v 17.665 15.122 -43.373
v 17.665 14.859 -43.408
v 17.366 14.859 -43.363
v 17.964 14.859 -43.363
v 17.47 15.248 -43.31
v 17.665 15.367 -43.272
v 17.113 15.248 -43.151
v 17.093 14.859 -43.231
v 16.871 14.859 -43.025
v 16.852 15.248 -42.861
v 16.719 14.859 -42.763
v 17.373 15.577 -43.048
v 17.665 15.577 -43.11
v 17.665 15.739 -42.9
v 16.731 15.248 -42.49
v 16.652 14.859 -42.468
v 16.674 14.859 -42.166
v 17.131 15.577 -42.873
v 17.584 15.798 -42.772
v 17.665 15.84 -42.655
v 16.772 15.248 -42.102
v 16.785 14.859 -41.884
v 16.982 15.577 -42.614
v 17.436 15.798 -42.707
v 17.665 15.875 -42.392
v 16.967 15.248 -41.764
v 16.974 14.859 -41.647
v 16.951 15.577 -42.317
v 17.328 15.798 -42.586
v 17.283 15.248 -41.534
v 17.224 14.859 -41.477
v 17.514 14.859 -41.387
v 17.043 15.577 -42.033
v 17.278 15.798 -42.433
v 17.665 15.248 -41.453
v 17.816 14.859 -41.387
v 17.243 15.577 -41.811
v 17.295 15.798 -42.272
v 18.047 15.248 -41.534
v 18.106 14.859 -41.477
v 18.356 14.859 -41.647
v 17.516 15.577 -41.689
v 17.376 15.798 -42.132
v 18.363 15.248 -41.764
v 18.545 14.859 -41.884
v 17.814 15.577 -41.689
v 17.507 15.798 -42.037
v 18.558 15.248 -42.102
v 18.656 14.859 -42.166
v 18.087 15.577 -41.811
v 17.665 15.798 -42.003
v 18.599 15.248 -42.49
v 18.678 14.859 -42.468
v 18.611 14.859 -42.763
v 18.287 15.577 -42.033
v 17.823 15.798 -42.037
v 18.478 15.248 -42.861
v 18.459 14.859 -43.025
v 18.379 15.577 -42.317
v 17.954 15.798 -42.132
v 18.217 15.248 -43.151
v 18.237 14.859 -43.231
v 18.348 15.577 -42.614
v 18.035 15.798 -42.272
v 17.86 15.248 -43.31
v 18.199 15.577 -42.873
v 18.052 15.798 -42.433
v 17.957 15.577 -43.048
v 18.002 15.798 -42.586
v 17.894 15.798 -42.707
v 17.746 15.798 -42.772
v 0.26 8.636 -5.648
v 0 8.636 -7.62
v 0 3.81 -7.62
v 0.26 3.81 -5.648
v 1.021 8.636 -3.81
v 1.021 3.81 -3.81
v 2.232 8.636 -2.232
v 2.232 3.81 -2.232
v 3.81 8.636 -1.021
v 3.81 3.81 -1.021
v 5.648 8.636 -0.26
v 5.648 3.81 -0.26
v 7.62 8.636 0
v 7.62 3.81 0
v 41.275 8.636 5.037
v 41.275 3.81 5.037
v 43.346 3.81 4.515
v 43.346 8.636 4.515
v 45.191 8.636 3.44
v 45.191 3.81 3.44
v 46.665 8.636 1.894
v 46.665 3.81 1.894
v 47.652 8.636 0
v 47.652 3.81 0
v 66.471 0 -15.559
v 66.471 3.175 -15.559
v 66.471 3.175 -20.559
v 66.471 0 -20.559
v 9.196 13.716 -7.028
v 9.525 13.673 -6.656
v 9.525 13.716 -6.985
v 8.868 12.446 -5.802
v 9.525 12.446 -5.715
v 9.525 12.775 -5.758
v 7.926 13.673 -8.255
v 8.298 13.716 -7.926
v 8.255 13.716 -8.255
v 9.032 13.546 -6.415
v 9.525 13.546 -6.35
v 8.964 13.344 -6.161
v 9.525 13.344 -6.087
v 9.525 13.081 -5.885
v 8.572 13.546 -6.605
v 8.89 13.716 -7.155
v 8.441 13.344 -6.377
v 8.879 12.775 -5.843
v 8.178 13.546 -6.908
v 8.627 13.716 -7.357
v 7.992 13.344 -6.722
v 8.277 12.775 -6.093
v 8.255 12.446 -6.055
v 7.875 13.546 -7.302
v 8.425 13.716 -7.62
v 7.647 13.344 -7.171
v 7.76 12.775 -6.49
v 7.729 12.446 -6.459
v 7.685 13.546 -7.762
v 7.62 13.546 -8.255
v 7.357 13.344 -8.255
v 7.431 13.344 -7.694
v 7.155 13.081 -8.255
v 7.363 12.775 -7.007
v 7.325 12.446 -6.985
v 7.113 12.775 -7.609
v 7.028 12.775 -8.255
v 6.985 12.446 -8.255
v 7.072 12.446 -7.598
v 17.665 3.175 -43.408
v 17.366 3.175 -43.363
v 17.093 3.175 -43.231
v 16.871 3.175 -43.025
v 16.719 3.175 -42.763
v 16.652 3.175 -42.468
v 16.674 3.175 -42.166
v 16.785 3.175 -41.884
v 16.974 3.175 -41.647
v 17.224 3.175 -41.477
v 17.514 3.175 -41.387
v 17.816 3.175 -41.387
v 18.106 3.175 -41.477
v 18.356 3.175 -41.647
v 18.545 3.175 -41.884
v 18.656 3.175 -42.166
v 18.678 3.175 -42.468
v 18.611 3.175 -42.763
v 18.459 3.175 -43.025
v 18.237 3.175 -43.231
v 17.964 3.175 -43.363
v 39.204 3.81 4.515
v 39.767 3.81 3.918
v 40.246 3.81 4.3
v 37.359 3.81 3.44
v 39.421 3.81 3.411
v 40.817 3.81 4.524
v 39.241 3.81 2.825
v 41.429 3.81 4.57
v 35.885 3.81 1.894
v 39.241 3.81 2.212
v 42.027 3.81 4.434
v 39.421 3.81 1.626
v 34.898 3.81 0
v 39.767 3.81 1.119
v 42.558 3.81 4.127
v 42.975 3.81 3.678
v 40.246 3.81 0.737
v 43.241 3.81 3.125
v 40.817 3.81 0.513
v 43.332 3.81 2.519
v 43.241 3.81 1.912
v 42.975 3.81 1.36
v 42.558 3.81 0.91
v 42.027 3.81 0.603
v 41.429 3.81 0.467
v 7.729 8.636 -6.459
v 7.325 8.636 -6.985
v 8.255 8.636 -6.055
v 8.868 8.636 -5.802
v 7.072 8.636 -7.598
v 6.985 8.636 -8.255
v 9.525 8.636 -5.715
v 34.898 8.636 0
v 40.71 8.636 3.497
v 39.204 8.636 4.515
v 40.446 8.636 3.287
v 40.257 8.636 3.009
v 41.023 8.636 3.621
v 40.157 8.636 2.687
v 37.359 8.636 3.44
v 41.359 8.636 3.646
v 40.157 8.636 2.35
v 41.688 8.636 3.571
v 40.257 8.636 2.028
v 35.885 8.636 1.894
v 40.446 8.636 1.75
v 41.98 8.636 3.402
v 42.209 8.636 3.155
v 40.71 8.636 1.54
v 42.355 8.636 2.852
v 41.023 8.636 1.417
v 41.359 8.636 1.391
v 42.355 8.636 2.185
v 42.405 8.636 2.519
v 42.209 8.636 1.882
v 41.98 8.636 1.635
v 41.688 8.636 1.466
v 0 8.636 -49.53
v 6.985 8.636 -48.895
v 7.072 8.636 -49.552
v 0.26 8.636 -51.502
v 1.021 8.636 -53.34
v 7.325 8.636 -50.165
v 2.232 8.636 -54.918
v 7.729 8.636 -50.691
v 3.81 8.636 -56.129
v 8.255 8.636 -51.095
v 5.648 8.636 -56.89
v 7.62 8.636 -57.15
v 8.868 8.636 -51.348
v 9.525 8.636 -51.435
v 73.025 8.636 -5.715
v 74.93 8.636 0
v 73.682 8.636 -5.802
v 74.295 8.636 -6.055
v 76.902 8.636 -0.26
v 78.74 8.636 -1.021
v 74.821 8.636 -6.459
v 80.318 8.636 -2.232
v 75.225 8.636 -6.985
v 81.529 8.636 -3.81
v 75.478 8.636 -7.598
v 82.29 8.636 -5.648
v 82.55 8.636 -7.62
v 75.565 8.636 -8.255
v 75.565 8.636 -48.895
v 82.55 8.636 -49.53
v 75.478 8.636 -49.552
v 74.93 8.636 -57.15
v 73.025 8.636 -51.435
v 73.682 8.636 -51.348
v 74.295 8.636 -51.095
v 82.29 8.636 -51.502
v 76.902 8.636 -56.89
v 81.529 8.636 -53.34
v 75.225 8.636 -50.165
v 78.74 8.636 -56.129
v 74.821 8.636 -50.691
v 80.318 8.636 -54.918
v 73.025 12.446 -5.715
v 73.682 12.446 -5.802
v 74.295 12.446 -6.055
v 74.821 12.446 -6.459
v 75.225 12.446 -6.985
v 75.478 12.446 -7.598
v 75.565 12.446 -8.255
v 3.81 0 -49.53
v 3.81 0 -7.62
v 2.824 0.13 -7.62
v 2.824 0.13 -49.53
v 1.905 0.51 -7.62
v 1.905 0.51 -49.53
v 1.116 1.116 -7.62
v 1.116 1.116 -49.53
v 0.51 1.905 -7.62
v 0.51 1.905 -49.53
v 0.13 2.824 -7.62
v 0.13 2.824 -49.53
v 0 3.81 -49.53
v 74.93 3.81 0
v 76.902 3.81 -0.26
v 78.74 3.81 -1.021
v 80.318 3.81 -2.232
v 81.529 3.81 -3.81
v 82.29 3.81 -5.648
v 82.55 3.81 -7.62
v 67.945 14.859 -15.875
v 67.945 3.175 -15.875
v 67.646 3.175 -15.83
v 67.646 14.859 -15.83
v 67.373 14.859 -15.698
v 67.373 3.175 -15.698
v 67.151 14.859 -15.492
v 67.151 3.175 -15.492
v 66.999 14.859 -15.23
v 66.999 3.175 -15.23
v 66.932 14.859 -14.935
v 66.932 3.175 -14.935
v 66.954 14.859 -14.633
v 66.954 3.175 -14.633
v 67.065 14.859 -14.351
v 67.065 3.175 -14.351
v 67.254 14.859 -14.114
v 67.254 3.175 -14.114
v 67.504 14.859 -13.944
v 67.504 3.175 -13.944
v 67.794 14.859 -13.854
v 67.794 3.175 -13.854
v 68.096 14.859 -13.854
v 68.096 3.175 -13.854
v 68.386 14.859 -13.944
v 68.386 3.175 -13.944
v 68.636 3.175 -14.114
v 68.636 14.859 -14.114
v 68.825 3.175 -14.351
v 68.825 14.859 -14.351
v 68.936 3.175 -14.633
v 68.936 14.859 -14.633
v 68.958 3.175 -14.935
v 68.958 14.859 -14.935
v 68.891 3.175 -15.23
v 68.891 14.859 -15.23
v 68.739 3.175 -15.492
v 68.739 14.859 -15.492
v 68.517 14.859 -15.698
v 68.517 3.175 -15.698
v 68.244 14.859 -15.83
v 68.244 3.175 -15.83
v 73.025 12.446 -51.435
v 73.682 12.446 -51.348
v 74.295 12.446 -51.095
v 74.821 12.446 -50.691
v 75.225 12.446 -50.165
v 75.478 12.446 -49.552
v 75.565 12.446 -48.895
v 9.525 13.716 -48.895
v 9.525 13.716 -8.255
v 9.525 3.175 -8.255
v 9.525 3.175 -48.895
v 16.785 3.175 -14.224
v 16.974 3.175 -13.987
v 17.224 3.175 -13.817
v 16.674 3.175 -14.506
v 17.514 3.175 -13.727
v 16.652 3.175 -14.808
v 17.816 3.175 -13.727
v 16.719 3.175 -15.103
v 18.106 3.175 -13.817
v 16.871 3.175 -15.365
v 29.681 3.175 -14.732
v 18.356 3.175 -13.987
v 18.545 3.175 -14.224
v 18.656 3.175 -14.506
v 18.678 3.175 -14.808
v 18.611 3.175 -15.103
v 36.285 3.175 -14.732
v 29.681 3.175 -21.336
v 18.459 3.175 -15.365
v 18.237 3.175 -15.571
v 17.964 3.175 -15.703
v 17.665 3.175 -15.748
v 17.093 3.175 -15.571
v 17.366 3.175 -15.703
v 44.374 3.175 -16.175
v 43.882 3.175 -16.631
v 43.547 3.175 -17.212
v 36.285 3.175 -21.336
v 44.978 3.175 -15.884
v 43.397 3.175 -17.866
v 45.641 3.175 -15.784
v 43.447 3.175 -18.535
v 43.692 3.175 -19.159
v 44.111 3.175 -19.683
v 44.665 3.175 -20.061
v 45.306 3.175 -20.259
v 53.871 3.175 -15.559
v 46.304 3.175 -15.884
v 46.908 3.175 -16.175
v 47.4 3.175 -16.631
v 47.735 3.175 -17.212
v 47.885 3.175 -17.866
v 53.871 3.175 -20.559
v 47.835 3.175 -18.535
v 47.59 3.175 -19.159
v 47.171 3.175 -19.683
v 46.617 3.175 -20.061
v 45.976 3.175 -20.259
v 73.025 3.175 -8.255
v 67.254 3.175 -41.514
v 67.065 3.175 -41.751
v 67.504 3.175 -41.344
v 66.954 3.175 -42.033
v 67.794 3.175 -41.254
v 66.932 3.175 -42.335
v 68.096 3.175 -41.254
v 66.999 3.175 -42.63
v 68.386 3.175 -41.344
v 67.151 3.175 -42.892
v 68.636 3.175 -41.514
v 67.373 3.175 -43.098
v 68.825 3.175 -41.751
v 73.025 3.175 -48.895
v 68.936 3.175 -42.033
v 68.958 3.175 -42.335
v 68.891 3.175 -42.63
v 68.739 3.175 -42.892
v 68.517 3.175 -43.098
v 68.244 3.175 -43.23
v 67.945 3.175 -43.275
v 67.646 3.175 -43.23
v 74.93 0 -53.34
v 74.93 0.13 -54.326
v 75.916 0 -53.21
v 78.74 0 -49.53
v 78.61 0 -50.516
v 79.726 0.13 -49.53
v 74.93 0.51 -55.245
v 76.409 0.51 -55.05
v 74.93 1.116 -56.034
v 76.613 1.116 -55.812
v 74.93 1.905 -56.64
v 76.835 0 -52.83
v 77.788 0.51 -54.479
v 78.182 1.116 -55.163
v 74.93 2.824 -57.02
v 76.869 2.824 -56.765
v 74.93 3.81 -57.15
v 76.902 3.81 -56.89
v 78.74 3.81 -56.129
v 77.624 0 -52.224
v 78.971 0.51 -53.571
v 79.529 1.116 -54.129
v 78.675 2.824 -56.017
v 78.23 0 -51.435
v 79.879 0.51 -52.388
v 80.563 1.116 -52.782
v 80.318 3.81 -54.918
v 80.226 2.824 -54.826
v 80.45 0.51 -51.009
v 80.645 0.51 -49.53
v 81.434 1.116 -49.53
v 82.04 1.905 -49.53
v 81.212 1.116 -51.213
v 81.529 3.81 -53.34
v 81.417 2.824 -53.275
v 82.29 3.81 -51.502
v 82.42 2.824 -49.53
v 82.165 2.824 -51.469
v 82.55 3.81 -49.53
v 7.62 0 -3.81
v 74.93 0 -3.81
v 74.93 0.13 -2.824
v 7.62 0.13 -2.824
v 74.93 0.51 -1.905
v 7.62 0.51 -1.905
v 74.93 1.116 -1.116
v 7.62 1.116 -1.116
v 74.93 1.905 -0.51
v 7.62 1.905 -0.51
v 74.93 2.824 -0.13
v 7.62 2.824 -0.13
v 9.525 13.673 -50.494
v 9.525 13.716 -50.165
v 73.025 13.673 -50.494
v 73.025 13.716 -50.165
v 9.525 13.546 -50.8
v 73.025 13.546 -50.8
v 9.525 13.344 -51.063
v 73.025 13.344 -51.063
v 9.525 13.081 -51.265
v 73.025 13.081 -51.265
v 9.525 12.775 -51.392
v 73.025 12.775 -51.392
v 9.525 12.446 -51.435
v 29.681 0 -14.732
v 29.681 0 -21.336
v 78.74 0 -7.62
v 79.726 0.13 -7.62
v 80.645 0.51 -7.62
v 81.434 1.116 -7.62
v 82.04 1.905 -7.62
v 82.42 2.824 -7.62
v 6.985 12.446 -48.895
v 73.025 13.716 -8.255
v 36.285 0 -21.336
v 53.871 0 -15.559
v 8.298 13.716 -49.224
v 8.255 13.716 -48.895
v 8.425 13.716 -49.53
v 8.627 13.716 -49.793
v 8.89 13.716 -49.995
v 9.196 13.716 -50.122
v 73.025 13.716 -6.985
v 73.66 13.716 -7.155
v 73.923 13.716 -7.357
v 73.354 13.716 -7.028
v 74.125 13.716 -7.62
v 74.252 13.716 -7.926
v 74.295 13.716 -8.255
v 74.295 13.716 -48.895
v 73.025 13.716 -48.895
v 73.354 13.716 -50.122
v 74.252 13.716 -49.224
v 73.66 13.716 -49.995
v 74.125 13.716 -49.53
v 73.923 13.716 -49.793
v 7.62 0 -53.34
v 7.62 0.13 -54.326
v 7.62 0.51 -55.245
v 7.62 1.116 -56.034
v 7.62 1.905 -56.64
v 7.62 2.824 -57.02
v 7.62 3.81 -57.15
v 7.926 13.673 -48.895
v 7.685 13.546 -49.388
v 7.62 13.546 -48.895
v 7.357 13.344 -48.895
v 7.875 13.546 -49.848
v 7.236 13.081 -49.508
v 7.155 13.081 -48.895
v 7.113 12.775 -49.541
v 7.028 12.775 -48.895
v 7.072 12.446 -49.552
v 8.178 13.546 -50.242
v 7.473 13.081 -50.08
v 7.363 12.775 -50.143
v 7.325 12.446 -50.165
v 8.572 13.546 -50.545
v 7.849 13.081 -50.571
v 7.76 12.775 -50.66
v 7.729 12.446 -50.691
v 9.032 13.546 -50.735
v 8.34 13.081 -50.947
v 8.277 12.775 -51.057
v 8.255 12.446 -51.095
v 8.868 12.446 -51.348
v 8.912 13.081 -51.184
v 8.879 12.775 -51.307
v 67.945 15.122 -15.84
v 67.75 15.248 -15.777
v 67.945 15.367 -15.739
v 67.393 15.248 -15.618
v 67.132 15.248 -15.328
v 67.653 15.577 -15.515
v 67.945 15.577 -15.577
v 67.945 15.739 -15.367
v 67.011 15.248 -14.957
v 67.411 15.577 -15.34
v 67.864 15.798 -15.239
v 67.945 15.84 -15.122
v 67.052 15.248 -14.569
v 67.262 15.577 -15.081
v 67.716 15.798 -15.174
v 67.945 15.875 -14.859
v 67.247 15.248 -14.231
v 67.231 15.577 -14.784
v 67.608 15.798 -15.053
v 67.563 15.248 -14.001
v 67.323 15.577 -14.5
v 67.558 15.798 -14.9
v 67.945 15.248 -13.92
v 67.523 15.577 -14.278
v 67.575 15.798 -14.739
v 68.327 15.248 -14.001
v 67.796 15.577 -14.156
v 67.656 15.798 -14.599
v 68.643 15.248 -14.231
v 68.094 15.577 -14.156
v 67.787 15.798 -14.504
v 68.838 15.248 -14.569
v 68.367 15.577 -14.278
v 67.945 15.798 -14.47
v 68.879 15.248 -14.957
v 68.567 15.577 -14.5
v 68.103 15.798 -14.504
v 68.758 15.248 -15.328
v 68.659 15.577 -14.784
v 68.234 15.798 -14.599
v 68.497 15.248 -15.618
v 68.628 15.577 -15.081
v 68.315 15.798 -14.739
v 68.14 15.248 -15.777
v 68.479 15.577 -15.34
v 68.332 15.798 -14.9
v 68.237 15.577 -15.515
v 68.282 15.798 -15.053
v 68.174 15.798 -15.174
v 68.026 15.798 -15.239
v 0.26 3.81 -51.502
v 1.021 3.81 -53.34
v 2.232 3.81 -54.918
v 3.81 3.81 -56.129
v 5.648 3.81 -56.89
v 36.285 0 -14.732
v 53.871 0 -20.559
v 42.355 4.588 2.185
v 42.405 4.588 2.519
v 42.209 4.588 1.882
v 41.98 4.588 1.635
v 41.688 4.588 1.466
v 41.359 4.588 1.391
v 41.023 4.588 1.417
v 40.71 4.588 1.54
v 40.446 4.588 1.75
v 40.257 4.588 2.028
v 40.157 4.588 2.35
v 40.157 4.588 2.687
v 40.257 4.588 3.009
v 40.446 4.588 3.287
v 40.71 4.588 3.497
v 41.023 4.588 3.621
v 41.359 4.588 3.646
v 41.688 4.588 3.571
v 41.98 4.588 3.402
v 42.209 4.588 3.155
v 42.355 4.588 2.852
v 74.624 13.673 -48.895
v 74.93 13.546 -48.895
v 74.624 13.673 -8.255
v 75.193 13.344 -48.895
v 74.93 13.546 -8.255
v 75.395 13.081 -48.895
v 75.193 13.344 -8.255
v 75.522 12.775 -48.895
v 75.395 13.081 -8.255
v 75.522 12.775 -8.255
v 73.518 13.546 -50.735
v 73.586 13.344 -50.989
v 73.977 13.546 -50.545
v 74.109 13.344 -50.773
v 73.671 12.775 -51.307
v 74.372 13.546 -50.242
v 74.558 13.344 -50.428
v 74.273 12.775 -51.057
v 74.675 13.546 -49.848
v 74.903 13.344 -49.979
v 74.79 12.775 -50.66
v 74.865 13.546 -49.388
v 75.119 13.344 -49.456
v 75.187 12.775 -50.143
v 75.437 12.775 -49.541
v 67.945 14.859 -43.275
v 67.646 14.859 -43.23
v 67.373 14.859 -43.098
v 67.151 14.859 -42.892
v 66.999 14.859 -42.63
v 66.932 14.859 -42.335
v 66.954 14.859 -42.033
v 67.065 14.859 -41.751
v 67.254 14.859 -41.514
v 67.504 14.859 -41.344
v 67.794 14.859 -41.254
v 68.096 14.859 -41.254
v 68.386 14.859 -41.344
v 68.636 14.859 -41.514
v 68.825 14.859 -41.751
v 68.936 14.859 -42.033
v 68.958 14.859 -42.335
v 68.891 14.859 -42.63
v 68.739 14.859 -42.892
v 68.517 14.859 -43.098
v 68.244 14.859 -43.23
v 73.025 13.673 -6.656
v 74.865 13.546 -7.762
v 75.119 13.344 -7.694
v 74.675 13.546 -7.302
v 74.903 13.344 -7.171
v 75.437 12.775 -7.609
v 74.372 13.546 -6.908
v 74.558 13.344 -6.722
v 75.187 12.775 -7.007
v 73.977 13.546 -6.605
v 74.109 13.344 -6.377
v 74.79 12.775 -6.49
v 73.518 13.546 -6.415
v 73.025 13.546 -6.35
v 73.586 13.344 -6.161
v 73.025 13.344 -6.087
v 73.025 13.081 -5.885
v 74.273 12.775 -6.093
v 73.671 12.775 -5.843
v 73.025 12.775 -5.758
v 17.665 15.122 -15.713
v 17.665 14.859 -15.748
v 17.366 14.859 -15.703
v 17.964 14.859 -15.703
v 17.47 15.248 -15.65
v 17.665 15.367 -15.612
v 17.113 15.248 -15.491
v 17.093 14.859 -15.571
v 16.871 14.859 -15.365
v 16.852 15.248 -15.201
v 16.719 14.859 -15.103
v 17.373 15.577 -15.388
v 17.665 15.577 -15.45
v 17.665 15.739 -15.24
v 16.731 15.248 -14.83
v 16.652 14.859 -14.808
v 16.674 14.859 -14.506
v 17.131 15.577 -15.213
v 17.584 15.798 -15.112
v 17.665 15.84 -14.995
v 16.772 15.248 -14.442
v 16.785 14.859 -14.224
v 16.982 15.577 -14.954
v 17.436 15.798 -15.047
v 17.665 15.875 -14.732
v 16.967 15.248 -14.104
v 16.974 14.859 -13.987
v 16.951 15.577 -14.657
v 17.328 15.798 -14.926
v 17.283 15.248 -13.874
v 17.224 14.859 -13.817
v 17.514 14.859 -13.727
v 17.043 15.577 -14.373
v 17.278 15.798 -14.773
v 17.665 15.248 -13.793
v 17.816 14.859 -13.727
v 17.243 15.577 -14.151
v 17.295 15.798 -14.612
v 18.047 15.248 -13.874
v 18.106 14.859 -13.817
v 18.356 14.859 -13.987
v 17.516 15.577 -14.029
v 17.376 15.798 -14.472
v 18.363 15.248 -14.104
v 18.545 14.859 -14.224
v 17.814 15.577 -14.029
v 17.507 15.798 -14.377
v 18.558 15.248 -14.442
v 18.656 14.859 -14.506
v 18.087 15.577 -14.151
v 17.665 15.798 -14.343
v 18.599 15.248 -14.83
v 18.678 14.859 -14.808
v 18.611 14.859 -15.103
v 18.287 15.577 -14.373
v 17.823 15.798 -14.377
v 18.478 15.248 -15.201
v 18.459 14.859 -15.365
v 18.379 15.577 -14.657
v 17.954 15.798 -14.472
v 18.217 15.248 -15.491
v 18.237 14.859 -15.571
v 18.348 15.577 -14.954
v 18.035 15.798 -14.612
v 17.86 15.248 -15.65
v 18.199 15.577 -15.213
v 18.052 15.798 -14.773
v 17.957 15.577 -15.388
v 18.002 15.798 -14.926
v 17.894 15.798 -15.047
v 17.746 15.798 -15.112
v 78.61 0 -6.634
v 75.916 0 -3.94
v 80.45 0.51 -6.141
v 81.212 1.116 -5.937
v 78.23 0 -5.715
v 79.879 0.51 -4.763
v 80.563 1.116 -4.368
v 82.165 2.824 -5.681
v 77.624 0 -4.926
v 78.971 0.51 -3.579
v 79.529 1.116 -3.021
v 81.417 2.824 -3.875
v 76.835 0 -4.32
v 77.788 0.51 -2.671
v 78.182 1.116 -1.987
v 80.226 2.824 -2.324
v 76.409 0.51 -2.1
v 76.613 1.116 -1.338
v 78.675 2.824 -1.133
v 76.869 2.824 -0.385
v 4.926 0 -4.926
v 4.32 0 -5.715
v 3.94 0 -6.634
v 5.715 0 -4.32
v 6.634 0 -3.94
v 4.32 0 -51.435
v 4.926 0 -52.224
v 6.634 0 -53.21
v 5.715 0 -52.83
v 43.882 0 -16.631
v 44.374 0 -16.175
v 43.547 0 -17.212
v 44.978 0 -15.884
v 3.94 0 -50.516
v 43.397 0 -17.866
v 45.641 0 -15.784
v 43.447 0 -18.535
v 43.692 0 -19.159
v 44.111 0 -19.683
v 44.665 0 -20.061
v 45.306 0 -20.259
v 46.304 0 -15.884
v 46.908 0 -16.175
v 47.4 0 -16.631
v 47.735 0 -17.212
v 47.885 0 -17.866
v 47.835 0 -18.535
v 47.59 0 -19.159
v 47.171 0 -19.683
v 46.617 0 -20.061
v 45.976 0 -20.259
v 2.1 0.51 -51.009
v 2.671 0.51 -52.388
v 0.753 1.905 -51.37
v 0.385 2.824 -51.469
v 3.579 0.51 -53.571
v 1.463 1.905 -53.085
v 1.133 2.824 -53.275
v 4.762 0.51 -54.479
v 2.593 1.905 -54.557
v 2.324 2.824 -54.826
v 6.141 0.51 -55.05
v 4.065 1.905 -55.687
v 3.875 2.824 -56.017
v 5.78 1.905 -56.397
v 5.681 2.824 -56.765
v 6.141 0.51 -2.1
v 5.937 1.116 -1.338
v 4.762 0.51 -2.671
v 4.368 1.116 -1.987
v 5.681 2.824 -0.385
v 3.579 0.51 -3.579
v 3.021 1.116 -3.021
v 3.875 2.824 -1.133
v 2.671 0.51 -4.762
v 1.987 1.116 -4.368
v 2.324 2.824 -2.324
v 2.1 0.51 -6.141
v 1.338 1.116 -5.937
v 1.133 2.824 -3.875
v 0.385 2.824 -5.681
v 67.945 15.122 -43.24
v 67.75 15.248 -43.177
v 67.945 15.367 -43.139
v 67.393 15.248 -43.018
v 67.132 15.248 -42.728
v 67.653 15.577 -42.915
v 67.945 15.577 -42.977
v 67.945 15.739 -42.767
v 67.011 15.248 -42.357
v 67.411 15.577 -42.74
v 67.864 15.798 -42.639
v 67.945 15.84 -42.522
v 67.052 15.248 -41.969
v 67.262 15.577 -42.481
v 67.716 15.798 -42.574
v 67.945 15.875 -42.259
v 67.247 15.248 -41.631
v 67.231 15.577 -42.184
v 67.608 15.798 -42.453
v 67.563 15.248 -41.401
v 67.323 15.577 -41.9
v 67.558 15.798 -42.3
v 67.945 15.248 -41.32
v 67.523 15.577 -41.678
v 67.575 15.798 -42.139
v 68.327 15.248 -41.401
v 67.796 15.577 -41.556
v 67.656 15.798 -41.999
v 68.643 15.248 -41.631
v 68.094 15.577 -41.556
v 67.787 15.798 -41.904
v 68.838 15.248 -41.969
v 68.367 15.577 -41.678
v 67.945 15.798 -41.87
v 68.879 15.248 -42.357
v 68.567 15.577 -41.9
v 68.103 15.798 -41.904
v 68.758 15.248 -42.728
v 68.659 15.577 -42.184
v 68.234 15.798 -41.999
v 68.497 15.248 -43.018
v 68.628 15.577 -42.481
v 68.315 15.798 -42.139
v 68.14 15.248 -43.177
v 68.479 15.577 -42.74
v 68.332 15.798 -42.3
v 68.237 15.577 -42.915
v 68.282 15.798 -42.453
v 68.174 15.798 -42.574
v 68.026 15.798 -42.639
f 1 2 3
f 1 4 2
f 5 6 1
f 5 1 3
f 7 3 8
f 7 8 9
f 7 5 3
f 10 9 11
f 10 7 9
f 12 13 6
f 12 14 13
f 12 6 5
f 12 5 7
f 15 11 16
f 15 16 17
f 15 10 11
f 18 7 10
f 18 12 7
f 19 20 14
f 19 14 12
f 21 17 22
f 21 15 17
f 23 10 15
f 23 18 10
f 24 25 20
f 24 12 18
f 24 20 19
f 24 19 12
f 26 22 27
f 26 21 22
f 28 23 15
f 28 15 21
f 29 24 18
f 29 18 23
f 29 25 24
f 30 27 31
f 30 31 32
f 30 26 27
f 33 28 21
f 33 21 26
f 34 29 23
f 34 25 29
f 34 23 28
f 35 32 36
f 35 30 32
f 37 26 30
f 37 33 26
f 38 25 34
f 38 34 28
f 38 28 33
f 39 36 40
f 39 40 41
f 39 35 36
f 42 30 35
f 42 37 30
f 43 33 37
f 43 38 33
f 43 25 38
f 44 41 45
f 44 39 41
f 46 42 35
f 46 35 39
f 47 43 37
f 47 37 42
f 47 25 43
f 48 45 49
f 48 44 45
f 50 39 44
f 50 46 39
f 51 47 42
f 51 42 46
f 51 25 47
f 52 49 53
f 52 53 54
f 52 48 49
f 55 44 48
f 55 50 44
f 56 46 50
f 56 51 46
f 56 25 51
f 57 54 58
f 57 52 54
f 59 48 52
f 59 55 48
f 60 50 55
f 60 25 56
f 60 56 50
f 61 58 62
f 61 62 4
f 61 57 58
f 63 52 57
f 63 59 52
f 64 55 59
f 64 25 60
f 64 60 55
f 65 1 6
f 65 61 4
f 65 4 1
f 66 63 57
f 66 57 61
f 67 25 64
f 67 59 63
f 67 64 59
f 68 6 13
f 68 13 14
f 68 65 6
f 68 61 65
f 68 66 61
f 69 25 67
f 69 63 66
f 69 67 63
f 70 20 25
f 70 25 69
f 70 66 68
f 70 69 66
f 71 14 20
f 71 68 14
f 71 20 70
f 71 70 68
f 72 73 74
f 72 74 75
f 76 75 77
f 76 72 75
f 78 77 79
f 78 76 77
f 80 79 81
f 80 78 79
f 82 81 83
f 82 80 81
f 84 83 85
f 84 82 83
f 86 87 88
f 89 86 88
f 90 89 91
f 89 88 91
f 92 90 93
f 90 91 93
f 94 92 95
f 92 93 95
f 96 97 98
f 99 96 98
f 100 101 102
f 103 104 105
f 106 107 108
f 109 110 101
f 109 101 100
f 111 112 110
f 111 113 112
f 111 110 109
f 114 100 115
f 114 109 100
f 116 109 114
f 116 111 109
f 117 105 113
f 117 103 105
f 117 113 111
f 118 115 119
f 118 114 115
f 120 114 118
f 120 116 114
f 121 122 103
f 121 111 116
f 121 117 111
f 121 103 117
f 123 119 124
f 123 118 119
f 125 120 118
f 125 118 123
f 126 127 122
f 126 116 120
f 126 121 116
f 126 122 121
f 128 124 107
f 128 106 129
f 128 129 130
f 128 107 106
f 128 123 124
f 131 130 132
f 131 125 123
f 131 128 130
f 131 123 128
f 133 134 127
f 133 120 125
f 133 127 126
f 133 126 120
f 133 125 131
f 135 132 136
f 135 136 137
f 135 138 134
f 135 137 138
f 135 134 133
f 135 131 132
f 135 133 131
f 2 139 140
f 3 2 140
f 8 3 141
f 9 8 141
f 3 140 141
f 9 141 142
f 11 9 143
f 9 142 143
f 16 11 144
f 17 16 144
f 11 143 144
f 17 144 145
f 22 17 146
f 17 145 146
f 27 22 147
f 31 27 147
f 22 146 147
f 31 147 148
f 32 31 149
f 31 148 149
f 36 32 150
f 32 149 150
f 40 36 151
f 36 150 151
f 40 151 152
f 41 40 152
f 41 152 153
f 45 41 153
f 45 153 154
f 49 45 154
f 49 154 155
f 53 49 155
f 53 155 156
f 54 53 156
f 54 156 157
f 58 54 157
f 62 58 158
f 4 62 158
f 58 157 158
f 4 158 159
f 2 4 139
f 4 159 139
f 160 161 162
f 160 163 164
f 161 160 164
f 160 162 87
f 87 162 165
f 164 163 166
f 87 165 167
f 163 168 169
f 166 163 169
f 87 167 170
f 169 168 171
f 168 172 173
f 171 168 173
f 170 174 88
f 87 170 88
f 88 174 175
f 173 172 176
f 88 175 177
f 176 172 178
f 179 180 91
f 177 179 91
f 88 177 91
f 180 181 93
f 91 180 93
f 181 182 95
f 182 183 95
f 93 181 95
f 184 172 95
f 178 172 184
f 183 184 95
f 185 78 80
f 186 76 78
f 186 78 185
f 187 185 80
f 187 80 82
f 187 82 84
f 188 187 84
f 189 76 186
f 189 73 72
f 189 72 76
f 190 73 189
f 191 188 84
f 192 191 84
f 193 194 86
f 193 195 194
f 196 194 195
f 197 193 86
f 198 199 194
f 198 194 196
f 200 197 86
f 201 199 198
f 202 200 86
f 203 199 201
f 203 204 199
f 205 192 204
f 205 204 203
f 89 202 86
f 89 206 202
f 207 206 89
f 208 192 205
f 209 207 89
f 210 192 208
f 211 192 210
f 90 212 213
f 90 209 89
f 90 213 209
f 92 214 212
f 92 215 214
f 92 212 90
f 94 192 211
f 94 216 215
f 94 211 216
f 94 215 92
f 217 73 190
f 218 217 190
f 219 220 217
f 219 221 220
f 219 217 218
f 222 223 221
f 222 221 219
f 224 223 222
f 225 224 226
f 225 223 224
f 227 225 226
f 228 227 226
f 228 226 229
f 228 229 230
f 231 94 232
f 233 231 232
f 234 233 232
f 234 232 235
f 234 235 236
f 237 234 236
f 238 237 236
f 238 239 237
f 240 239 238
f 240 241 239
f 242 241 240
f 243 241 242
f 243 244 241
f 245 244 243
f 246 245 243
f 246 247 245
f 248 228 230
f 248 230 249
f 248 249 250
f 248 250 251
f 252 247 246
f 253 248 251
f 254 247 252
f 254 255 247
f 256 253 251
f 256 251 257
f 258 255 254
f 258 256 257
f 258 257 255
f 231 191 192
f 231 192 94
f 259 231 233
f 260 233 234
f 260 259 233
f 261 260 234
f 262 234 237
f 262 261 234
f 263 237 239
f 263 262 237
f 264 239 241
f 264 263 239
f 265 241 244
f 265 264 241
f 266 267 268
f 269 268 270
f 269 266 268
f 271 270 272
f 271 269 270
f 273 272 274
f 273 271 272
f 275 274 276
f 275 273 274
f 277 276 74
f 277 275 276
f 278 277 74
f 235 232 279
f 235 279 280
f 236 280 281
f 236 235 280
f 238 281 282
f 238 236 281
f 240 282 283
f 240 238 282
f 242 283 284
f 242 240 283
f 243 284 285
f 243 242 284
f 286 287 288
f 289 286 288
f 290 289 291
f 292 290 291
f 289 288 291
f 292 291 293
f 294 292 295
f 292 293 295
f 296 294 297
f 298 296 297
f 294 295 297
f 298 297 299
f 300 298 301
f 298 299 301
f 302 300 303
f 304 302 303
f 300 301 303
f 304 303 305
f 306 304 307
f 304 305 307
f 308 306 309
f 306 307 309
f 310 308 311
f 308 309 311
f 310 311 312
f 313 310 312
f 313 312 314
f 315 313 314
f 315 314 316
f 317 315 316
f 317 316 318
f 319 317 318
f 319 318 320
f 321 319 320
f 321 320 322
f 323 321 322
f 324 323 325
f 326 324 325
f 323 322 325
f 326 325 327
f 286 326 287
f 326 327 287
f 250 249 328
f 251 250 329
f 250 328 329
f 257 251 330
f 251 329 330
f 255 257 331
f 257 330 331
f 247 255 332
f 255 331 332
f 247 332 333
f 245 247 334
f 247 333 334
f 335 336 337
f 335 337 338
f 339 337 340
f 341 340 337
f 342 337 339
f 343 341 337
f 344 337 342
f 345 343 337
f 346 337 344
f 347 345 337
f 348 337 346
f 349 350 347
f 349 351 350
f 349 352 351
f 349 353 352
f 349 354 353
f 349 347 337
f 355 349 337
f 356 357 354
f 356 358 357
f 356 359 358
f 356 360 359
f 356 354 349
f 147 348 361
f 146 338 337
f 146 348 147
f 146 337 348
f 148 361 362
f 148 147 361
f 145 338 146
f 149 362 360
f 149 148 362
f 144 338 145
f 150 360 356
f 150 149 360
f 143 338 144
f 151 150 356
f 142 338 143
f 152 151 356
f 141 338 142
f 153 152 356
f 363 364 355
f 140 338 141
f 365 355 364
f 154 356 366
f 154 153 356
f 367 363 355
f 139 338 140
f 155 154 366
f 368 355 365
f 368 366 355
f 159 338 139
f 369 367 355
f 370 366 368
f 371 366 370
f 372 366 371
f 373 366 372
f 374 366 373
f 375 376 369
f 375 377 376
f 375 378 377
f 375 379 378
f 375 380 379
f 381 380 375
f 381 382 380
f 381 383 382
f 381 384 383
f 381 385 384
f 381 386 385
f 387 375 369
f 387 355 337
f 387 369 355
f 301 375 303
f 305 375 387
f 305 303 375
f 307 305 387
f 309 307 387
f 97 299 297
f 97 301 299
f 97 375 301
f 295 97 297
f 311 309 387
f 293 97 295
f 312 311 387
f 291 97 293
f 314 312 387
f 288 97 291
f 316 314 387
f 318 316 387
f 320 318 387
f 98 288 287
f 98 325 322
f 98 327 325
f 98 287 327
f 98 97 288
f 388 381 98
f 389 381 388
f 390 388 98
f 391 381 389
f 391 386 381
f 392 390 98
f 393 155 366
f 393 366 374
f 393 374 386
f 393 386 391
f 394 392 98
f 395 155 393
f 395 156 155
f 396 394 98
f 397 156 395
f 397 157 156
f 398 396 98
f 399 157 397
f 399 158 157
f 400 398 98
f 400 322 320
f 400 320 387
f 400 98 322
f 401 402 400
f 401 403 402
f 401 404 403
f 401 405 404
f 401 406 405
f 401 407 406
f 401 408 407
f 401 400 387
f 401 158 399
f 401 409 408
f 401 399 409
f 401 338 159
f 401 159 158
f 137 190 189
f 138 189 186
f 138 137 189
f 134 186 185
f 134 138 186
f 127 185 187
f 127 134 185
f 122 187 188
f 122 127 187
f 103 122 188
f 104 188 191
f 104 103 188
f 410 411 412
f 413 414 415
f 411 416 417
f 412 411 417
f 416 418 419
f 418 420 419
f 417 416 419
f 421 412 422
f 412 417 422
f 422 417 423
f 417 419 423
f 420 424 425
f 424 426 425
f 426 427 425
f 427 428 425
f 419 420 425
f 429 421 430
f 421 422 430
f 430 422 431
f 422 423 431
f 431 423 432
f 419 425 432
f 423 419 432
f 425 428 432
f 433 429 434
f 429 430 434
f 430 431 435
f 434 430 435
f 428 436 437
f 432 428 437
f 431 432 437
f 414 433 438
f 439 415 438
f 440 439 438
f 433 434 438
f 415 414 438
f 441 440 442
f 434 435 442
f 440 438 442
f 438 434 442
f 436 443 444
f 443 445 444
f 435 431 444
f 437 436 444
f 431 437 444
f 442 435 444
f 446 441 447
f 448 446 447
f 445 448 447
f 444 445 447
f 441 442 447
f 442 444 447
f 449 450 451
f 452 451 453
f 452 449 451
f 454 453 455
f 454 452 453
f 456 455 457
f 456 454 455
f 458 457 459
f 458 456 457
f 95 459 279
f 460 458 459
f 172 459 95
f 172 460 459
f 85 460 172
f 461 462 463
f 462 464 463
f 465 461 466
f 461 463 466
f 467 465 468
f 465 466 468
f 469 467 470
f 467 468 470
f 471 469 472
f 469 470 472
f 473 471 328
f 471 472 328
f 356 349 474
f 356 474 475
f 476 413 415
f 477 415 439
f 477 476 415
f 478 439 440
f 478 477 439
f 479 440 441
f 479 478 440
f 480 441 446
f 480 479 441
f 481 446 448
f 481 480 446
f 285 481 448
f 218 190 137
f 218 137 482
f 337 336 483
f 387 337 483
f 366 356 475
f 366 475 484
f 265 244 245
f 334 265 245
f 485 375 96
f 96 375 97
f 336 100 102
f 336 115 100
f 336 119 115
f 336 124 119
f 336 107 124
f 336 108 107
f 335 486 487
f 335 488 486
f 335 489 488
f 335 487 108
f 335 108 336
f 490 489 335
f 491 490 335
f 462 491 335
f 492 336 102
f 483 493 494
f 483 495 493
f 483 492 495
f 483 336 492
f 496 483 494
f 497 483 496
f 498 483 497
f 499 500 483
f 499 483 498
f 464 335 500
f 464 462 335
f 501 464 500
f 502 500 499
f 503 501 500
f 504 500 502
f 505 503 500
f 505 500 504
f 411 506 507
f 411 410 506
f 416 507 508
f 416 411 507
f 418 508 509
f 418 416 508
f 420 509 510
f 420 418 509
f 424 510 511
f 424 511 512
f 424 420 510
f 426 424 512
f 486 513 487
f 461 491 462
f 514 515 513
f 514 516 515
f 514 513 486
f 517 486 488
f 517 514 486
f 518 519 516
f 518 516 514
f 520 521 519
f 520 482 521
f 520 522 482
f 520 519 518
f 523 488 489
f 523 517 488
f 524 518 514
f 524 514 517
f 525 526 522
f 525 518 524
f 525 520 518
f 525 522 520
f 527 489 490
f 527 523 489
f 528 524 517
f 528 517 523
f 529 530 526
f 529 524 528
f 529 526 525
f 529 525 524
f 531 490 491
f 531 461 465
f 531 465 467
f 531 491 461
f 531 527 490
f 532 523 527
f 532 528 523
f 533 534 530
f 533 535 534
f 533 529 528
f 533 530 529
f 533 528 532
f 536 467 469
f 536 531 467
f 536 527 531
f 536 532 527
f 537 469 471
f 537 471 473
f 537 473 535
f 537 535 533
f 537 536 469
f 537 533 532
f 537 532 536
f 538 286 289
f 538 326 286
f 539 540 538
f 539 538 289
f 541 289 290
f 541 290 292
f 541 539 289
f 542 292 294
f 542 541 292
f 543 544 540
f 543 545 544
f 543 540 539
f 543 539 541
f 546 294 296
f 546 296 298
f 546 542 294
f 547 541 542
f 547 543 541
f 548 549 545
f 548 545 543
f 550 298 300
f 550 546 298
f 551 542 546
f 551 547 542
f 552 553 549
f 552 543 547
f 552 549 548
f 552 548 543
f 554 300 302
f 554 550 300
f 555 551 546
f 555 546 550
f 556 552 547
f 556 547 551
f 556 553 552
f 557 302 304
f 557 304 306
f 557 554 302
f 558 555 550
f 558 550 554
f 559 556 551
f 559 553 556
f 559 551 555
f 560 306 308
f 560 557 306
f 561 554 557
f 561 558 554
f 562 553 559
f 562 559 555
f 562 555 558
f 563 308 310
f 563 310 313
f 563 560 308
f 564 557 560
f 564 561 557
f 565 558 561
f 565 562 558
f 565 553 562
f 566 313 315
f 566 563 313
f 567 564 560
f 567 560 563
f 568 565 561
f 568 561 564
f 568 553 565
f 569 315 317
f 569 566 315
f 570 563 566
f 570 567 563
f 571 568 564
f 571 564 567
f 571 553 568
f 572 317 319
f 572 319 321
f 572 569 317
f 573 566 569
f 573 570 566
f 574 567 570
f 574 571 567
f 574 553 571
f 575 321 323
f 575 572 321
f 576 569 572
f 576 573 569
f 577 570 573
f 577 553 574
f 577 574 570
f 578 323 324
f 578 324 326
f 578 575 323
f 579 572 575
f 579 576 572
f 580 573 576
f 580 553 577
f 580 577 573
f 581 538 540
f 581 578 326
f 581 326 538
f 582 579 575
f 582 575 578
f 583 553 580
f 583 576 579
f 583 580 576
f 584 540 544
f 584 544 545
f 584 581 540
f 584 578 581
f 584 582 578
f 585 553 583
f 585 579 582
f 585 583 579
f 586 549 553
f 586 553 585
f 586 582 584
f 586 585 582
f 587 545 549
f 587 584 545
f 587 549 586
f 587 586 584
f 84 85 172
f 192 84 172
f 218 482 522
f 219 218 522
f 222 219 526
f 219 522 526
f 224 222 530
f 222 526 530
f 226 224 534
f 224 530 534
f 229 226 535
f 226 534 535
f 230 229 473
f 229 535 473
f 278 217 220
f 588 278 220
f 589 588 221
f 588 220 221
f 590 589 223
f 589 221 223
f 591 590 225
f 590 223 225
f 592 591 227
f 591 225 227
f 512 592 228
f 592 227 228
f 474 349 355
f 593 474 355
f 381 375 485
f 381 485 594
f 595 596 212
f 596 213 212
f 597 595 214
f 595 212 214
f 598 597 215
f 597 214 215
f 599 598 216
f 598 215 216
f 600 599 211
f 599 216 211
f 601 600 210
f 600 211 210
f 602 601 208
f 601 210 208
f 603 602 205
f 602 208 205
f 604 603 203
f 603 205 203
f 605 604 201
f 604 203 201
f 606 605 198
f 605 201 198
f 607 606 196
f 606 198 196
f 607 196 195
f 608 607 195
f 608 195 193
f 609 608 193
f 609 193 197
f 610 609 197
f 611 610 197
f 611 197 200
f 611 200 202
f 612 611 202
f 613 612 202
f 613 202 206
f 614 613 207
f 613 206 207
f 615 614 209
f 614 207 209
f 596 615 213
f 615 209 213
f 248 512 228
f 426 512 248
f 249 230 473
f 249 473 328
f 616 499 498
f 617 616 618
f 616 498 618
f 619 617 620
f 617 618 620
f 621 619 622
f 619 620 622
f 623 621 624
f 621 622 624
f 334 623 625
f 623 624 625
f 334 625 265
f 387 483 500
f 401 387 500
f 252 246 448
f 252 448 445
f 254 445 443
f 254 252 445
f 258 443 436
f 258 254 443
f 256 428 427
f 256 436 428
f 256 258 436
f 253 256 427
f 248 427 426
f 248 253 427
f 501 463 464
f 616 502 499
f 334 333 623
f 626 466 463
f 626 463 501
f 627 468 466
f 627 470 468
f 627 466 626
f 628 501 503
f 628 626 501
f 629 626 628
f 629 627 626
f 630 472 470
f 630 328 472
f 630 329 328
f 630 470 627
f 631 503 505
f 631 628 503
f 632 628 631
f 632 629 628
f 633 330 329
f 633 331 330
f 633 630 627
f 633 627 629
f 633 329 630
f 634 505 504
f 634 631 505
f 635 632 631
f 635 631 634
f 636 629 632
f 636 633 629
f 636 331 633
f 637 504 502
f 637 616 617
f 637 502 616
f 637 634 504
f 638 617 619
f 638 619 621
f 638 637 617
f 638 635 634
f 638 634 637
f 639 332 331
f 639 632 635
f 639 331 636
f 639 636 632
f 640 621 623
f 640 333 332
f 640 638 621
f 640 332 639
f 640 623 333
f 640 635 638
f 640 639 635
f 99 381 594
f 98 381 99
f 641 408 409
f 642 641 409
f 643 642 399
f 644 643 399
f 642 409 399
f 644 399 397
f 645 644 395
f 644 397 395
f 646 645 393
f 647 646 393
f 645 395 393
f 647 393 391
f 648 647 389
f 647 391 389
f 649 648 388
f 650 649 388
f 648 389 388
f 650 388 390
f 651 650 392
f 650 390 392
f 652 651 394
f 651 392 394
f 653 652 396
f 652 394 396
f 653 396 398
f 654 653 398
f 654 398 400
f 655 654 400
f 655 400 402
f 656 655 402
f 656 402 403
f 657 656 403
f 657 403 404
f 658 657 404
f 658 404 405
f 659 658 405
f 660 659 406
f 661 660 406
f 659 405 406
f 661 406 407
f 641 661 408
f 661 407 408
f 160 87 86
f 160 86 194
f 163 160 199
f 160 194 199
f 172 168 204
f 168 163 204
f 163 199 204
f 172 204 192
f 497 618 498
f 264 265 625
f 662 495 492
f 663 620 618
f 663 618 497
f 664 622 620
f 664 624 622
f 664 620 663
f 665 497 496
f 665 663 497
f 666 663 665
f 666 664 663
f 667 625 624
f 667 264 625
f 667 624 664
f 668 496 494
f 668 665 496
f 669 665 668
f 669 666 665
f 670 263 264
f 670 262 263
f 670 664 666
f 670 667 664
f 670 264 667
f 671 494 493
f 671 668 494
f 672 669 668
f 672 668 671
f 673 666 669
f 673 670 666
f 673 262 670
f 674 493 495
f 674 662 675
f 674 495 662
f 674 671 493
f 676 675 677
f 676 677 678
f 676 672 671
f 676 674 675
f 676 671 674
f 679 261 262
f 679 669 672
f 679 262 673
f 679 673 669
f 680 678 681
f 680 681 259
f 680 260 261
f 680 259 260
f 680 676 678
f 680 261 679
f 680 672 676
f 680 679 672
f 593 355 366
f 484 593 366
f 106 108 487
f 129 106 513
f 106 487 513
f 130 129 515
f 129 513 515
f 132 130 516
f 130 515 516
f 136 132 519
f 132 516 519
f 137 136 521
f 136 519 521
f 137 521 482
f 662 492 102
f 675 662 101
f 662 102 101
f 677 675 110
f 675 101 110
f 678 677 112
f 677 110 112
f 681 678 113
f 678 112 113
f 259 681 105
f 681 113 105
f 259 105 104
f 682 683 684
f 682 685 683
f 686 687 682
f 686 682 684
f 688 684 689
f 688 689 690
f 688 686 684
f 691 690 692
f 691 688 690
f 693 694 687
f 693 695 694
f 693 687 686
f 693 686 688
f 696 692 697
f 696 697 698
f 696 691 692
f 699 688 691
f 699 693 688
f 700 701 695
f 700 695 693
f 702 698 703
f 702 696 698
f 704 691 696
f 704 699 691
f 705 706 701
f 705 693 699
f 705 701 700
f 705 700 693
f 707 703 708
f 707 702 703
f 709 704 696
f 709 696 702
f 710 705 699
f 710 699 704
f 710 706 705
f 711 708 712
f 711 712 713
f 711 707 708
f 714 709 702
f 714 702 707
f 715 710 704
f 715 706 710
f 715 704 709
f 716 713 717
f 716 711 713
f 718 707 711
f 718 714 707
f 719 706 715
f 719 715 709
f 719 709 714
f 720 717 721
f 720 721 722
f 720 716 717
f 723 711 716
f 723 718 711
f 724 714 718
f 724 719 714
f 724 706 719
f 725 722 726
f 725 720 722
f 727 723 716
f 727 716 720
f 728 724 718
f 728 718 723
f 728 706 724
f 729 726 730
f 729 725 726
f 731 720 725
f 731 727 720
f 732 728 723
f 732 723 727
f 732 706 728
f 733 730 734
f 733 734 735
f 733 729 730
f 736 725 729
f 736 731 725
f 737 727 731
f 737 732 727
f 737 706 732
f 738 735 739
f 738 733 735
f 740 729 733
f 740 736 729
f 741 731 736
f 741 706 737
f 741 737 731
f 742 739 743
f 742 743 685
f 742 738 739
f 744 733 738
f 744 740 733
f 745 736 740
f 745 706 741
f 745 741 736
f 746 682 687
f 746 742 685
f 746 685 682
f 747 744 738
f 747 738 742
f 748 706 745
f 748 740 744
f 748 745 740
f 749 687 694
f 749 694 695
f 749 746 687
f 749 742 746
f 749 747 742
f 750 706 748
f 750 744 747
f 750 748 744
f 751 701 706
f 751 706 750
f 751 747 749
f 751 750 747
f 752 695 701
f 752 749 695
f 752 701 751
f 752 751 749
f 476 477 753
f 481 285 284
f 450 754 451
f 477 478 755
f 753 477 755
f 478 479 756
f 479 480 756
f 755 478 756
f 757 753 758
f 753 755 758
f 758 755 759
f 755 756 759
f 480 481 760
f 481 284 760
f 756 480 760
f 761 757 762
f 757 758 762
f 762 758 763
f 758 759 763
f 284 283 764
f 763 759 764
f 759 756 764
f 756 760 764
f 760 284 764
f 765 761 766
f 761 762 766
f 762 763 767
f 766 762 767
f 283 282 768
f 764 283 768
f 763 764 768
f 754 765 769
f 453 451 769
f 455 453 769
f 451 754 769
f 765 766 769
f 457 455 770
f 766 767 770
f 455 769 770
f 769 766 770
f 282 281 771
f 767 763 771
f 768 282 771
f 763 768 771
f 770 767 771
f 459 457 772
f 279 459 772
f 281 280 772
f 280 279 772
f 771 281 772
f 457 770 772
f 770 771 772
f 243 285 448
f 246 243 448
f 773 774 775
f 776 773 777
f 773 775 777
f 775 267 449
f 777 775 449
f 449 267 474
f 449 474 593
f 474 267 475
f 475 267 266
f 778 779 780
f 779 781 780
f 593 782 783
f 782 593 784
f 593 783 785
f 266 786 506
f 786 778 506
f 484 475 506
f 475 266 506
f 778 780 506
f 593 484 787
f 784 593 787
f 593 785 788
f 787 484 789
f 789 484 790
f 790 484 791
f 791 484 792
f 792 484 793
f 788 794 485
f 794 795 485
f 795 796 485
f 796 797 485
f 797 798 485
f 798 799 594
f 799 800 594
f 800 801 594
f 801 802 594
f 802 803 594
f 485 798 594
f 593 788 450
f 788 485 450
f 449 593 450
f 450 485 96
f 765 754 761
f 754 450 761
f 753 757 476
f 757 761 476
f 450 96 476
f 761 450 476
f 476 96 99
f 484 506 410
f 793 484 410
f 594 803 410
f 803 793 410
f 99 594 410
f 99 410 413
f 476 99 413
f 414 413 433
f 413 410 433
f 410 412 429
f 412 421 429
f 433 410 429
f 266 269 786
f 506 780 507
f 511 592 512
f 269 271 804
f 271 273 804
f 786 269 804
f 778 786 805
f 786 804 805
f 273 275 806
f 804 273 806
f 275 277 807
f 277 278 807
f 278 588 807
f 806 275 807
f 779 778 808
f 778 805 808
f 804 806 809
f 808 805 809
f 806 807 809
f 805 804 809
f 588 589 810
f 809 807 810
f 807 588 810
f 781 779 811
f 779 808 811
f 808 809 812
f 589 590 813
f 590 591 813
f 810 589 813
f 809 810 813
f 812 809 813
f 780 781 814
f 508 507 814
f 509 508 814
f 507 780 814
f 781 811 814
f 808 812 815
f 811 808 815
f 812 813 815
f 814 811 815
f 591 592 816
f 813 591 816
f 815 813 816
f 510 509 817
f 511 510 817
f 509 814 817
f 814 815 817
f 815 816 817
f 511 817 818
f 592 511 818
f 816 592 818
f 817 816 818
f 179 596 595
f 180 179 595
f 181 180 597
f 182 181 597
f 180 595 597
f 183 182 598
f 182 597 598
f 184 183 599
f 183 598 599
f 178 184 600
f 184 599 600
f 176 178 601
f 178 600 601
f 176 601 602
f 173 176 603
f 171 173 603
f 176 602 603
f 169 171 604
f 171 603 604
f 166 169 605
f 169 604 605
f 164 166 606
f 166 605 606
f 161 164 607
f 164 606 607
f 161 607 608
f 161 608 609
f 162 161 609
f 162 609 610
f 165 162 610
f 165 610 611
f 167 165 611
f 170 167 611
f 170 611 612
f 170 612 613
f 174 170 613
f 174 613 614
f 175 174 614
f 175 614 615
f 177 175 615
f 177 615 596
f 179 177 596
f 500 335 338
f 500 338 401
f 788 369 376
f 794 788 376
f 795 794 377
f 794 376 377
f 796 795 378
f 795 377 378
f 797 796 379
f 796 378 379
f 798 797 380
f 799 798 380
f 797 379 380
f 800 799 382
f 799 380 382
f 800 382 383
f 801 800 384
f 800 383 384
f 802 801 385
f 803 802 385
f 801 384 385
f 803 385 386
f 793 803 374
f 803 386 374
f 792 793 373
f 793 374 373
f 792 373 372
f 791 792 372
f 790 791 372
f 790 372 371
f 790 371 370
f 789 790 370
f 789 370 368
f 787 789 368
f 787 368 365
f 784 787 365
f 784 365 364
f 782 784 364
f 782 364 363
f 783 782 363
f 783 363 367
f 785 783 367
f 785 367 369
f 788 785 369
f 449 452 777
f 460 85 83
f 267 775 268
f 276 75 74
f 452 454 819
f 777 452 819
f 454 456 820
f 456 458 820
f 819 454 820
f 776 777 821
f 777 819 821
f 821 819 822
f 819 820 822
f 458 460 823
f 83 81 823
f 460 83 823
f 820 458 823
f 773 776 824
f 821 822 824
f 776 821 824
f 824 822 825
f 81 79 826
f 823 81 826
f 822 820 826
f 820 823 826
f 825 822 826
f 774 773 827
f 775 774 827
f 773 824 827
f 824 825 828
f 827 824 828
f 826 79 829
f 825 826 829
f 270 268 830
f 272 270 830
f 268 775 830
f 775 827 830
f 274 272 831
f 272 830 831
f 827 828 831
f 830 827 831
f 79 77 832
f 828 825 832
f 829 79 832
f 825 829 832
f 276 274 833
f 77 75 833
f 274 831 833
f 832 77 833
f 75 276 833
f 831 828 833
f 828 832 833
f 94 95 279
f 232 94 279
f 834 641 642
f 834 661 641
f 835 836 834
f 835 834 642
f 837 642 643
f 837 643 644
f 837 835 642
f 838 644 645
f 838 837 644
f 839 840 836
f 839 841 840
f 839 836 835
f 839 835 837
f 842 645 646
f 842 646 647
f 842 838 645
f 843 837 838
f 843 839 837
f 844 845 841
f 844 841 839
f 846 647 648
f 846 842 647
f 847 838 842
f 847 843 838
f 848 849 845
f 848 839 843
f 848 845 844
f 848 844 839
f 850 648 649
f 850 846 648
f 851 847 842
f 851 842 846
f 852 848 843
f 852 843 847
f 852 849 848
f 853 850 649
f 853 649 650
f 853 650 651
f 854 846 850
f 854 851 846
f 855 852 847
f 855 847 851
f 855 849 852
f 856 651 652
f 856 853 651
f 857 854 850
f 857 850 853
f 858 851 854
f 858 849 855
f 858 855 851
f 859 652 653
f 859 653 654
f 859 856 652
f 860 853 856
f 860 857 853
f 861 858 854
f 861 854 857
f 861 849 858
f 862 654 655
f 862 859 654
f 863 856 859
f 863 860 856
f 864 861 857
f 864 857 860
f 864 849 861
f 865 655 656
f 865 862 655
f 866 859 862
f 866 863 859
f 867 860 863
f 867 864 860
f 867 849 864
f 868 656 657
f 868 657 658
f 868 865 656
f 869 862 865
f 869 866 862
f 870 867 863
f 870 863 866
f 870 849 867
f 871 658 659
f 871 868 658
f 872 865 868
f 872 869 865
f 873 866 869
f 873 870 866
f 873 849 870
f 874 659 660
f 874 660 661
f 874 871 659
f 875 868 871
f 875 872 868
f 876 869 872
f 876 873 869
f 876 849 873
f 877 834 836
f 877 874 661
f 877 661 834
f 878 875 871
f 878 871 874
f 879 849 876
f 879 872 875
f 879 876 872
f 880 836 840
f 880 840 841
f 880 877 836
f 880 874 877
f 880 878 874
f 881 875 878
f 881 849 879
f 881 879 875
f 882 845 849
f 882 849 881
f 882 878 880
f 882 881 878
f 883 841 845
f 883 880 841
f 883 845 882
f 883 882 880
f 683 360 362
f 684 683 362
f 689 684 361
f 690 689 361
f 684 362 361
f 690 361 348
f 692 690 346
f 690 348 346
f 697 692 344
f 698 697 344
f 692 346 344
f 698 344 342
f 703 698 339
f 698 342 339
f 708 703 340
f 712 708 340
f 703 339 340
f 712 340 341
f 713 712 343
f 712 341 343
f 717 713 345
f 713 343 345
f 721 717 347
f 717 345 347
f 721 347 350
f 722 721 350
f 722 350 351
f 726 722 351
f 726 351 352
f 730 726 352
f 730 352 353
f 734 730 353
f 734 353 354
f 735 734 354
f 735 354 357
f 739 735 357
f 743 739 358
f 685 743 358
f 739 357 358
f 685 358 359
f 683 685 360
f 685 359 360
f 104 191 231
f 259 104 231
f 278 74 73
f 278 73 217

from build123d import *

# Parameters (mm, degrees)
SKETCH1_W                       = 82.55
SKETCH1_H                       = 57.15
BOSS_EXTRUDE1_DEPTH             = 8.636
FILLET2_R                       = 7.62
FILLET3_R                       = 3.81
SKETCH2_W                       = 63.5
SKETCH2_H                       = 40.64
CUT_EXTRUDE1_DEPTH              = 5.461
SKETCH7_W                       = 68.58
SKETCH7_H                       = 45.72
BOSS_EXTRUDE3_DEPTH             = 5.08
SKETCH8_W                       = 63.5
SKETCH8_H                       = 40.64
CUT_EXTRUDE3_DEPTH              = 5.08
SKETCH5_R                       = 1.016
BOSS_EXTRUDE4_DEPTH             = 12.7
SKETCH4_R                       = 2.25
SKETCH4_W                       = 12.6
SKETCH4_H                       = 5
SKETCH4_W_2                     = 6.604
SKETCH4_H_2                     = 6.604
CUT_EXTRUDE2_DEPTH              = 7.366
FILLET7_R                       = 1.016
FILLET8_R                       = 2.54
SKETCH9_W                       = 12.753817634
SKETCH9_H                       = 4.826
BOSS_EXTRUDE5_DEPTH             = 5.08
FILLET10_R                      = 7.62
FILLET11_R                      = 1.27
FILLET12_R                      = 1.016
F_4_40_TAPPED_HOLE2_D           = 2.2606
F_4_40_TAPPED_HOLE2_DEPTH       = 7.62
F_4_40_TAPPED_HOLE2_CSINK_D     = 4.1148
F_4_40_TAPPED_HOLE2_CSINK_ANGLE = 100
F_4_40_TAPPED_HOLE2_TIP         = 0.679152758


with BuildPart() as part:
    # Sketch1 → Boss-Extrude1 (new body)
    with BuildSketch(Plane(origin=(0, 0, 0), x_dir=(1, 0, 0), z_dir=(0, 1, 0))):
        with Locations((41.275, 28.575)):
            Rectangle(SKETCH1_W, SKETCH1_H)
    extrude(amount=BOSS_EXTRUDE1_DEPTH)

    # Fillet2
    fillet2_edges = [part.edges().sort_by_distance(p)[0] for p in [
        (0, 4.318, -57.15),
        (82.55, 4.318, -57.15),
        (82.55, 4.318, 0),
        (0, 4.318, 0),
    ]]
    fillet(fillet2_edges, radius=FILLET2_R)

    # Fillet3
    fillet3_edges = [part.edges().sort_by_distance(p)[0] for p in [
        (41.275, 0, -57.15),
        (0, 0, -28.575),
        (82.55, 0, -28.575),
        (41.275, 0, 0),
        (2.231846327, 0, -54.918153673),
        (2.231846327, 0, -2.231846327),
        (80.318153673, 0, -2.231846327),
        (80.318153673, 0, -54.918153673),
    ]]
    fillet(fillet3_edges, radius=FILLET3_R)

    # Sketch2 → Cut-Extrude1 (cut)
    with BuildSketch(Plane(origin=(0, 8.636, 0), x_dir=(1, 0, 0), z_dir=(0, 1, 0))):
        with Locations((41.275, 28.575)):
            Rectangle(SKETCH2_W, SKETCH2_H)
    extrude(amount=-CUT_EXTRUDE1_DEPTH, mode=Mode.SUBTRACT)

    # Sketch7 → Boss-Extrude3 (add)
    with BuildSketch(Plane(origin=(0, 8.636, 0), x_dir=(1, 0, 0), z_dir=(0, 1, 0))):
        with Locations((41.275, 28.575)):
            Rectangle(SKETCH7_W, SKETCH7_H)
    extrude(amount=BOSS_EXTRUDE3_DEPTH)

    # Sketch8 → Cut-Extrude3 (cut)
    with BuildSketch(Plane(origin=(0, 13.716, 0), x_dir=(1, 0, 0), z_dir=(0, 1, 0))):
        with Locations((41.275, 28.575)):
            Rectangle(SKETCH8_W, SKETCH8_H)
    extrude(amount=-CUT_EXTRUDE3_DEPTH, mode=Mode.SUBTRACT)

    # Sketch5 → Boss-Extrude4 (add)
    with BuildSketch(Plane(origin=(0, 3.175, 0), x_dir=(1, 0, 0), z_dir=(0, 1, 0))):
        with Locations(Location((17.665, 42.392, 0), (0, 0, 90))):
            Circle(SKETCH5_R)
        with Locations(Location((17.665, 14.732, 0), (0, 0, 90))):
            Circle(SKETCH5_R)
        with Locations(Location((67.945, 42.259, 0), (0, 0, 90))):
            Circle(SKETCH5_R)
        with Locations(Location((67.945, 14.859, 0), (0, 0, 90))):
            Circle(SKETCH5_R)
    extrude(amount=BOSS_EXTRUDE4_DEPTH)

    # Sketch4 → Cut-Extrude2 (cut)
    with BuildSketch(Plane(origin=(0, 3.175, 0), x_dir=(1, 0, 0), z_dir=(0, 1, 0))):
        with Locations(Location((45.641, 18.034, 0), (0, 0, 270))):
            Circle(SKETCH4_R)
        with Locations((60.171, 18.059)):
            Rectangle(SKETCH4_W, SKETCH4_H)
        with Locations((32.983, 18.034)):
            Rectangle(SKETCH4_W_2, SKETCH4_H_2)
    extrude(amount=-CUT_EXTRUDE2_DEPTH, mode=Mode.SUBTRACT)

    # Fillet7
    fillet7_edges = [part.edges().sort_by_distance(p)[0] for p in [
        (17.665, 15.875, -41.376),
        (17.665, 15.875, -13.716),
        (67.945, 15.875, -41.243),
    ]]
    fillet(fillet7_edges, radius=FILLET7_R)

    # Fillet8
    fillet8_edges = [part.edges().sort_by_distance(p)[0] for p in [
        (75.565, 11.176, -51.435),
        (6.985, 11.176, -51.435),
        (6.985, 11.176, -5.715),
        (75.565, 11.176, -5.715),
    ]]
    fillet(fillet8_edges, radius=FILLET8_R)

    # Sketch9 → Boss-Extrude5 (add)
    with BuildSketch(Plane.XY):
        with Locations((41.275, 6.223)):
            Rectangle(SKETCH9_W, SKETCH9_H)
    extrude(amount=BOSS_EXTRUDE5_DEPTH)

    # Fillet10
    # the kernel refuses this fillet: 7.62 mm, written as the material it takes off along each edge
    with BuildSketch(Plane(origin=(47.651908817, -14.150512242, 5.08), x_dir=(0, 0, -1), z_dir=(0, 1, 0)), Plane(origin=(34.898091183, 26.596512242, 5.08), x_dir=(0, 0, -1), z_dir=(0, -1, 0))) as fillet10_piece_1:
        with BuildLine():
            CenterArc((7.62, 7.184204897), FILLET10_R, 180, 70.528779366)
            Line((0, 7.184204897), (-0.1524, 7.184204897))
            Line((-0.1524, 7.184204897), (-0.1524, 0))
            Line((-0.1524, 0), (0, -0.1524))
            ThreePointArc((0, -0.1524), (2.54, -0.1524), (5.0292, -0.143684098))
            Line((5.0292, -0.143684098), (5.08, 0))
        make_face()
    extrude(amount=40.747024484, mode=Mode.SUBTRACT)

    # Fillet11
    fillet11_edges = [part.edges().sort_by_distance(p)[0] for p in [
        (41.275, 13.716, -51.435),
        (75.565, 13.716, -28.575),
        (6.985, 13.716, -28.575),
        (41.275, 13.716, -5.715),
        (7.728948776, 13.716, -50.691051224),
        (7.728948776, 13.716, -6.458948776),
        (74.821051224, 13.716, -6.458948776),
        (74.821051224, 13.716, -50.691051224),
    ]]
    fillet(fillet11_edges, radius=FILLET11_R)

    # Fillet12
    fillet12_edges = [part.edges().sort_by_distance(p)[0] for p in [
        (67.945, 15.875, -13.843),
    ]]
    fillet(fillet12_edges, radius=FILLET12_R)

    # #4-40 Tapped Hole2
    with Locations(Plane(origin=(0, 3.81, 0), x_dir=(-1, 0, 0), z_dir=(0, -1, 0))):
        with Locations((-41.275, -2.518557543)):
            CounterSinkHole(F_4_40_TAPPED_HOLE2_D / 2, F_4_40_TAPPED_HOLE2_CSINK_D / 2, depth=F_4_40_TAPPED_HOLE2_DEPTH, counter_sink_angle=F_4_40_TAPPED_HOLE2_CSINK_ANGLE)
            with Locations((0, 0, -(F_4_40_TAPPED_HOLE2_DEPTH + F_4_40_TAPPED_HOLE2_TIP / 2))):  # 118° drill point
                Cone(0, F_4_40_TAPPED_HOLE2_D / 2, F_4_40_TAPPED_HOLE2_TIP, mode=Mode.SUBTRACT)


solid = part.part
